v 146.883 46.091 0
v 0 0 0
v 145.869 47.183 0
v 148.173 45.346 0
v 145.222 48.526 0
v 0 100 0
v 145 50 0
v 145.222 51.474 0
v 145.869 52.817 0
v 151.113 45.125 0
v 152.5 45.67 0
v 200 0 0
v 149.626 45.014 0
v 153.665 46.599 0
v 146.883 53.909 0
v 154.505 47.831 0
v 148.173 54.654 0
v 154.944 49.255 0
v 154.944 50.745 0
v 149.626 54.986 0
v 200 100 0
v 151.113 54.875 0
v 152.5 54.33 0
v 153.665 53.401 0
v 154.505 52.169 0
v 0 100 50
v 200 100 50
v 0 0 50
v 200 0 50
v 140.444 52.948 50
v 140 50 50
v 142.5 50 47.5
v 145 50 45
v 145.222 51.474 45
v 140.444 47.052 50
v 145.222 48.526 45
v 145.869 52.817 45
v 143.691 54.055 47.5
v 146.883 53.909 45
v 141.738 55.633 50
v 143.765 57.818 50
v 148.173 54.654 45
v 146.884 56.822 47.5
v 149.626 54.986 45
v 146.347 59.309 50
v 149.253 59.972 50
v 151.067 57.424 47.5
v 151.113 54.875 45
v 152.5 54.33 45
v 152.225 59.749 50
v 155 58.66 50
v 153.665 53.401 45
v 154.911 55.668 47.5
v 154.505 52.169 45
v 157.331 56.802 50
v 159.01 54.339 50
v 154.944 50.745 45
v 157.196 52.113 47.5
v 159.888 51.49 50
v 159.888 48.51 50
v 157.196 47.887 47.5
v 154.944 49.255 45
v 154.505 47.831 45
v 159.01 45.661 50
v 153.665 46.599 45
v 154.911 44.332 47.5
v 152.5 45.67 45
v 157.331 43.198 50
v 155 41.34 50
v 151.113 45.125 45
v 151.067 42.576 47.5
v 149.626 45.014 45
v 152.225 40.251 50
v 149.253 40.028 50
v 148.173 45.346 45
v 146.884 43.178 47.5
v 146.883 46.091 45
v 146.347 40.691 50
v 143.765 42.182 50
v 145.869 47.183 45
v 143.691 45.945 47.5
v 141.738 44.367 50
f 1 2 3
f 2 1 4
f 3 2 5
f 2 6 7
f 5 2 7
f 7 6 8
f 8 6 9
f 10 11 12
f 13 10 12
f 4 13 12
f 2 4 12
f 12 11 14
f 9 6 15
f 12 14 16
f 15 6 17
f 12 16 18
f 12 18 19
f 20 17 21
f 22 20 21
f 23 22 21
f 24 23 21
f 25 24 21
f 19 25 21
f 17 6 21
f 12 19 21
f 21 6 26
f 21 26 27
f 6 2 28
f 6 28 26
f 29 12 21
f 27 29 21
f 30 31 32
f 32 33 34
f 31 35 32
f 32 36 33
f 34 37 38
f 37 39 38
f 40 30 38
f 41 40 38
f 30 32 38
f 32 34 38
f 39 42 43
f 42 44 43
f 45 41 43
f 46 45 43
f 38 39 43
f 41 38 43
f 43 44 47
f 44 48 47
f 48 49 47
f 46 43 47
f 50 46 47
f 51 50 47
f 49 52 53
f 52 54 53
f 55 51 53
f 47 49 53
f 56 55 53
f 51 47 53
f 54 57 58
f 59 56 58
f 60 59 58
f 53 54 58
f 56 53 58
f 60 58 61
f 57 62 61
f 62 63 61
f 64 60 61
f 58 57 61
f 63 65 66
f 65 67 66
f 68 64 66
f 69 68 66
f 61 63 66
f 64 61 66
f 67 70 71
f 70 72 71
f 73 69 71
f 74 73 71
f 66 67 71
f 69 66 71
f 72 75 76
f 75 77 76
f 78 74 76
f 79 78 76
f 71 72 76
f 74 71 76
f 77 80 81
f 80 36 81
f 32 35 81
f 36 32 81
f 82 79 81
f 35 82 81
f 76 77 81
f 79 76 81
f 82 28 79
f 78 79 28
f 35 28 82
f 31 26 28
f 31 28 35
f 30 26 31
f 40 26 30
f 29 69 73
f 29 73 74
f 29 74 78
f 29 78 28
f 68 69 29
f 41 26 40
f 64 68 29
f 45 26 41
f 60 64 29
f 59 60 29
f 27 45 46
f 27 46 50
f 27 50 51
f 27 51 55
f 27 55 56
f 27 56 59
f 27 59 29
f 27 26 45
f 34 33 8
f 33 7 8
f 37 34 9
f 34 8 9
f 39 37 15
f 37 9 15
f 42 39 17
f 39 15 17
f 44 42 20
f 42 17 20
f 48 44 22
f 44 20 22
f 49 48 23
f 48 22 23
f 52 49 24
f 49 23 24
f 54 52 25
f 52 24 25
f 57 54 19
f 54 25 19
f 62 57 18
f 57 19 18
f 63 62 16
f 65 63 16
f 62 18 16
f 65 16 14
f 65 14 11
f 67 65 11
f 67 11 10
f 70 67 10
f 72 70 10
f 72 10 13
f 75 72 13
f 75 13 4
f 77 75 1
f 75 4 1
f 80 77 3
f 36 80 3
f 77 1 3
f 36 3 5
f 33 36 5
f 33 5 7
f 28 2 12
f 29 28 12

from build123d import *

# Parameters (mm, degrees)
F0_W           = 200
F0_H           = 100
F1_DEPTH       = 50
F3_D           = 10
F3_CSINK_D     = 20
F3_CSINK_ANGLE = 90


with BuildPart() as f1:
    # F0 (on Top) → F1 (new body)
    with BuildSketch(Plane.XY):
        with Locations((100, 50)):
            Rectangle(F0_W, F0_H)
    extrude(amount=F1_DEPTH)

    # F3 (through all)
    with Locations(Plane.XY.offset(50)):
        with Locations((150, 50)):
            CounterSinkHole(F3_D / 2, F3_CSINK_D / 2, counter_sink_angle=F3_CSINK_ANGLE)


solid = f1.part
